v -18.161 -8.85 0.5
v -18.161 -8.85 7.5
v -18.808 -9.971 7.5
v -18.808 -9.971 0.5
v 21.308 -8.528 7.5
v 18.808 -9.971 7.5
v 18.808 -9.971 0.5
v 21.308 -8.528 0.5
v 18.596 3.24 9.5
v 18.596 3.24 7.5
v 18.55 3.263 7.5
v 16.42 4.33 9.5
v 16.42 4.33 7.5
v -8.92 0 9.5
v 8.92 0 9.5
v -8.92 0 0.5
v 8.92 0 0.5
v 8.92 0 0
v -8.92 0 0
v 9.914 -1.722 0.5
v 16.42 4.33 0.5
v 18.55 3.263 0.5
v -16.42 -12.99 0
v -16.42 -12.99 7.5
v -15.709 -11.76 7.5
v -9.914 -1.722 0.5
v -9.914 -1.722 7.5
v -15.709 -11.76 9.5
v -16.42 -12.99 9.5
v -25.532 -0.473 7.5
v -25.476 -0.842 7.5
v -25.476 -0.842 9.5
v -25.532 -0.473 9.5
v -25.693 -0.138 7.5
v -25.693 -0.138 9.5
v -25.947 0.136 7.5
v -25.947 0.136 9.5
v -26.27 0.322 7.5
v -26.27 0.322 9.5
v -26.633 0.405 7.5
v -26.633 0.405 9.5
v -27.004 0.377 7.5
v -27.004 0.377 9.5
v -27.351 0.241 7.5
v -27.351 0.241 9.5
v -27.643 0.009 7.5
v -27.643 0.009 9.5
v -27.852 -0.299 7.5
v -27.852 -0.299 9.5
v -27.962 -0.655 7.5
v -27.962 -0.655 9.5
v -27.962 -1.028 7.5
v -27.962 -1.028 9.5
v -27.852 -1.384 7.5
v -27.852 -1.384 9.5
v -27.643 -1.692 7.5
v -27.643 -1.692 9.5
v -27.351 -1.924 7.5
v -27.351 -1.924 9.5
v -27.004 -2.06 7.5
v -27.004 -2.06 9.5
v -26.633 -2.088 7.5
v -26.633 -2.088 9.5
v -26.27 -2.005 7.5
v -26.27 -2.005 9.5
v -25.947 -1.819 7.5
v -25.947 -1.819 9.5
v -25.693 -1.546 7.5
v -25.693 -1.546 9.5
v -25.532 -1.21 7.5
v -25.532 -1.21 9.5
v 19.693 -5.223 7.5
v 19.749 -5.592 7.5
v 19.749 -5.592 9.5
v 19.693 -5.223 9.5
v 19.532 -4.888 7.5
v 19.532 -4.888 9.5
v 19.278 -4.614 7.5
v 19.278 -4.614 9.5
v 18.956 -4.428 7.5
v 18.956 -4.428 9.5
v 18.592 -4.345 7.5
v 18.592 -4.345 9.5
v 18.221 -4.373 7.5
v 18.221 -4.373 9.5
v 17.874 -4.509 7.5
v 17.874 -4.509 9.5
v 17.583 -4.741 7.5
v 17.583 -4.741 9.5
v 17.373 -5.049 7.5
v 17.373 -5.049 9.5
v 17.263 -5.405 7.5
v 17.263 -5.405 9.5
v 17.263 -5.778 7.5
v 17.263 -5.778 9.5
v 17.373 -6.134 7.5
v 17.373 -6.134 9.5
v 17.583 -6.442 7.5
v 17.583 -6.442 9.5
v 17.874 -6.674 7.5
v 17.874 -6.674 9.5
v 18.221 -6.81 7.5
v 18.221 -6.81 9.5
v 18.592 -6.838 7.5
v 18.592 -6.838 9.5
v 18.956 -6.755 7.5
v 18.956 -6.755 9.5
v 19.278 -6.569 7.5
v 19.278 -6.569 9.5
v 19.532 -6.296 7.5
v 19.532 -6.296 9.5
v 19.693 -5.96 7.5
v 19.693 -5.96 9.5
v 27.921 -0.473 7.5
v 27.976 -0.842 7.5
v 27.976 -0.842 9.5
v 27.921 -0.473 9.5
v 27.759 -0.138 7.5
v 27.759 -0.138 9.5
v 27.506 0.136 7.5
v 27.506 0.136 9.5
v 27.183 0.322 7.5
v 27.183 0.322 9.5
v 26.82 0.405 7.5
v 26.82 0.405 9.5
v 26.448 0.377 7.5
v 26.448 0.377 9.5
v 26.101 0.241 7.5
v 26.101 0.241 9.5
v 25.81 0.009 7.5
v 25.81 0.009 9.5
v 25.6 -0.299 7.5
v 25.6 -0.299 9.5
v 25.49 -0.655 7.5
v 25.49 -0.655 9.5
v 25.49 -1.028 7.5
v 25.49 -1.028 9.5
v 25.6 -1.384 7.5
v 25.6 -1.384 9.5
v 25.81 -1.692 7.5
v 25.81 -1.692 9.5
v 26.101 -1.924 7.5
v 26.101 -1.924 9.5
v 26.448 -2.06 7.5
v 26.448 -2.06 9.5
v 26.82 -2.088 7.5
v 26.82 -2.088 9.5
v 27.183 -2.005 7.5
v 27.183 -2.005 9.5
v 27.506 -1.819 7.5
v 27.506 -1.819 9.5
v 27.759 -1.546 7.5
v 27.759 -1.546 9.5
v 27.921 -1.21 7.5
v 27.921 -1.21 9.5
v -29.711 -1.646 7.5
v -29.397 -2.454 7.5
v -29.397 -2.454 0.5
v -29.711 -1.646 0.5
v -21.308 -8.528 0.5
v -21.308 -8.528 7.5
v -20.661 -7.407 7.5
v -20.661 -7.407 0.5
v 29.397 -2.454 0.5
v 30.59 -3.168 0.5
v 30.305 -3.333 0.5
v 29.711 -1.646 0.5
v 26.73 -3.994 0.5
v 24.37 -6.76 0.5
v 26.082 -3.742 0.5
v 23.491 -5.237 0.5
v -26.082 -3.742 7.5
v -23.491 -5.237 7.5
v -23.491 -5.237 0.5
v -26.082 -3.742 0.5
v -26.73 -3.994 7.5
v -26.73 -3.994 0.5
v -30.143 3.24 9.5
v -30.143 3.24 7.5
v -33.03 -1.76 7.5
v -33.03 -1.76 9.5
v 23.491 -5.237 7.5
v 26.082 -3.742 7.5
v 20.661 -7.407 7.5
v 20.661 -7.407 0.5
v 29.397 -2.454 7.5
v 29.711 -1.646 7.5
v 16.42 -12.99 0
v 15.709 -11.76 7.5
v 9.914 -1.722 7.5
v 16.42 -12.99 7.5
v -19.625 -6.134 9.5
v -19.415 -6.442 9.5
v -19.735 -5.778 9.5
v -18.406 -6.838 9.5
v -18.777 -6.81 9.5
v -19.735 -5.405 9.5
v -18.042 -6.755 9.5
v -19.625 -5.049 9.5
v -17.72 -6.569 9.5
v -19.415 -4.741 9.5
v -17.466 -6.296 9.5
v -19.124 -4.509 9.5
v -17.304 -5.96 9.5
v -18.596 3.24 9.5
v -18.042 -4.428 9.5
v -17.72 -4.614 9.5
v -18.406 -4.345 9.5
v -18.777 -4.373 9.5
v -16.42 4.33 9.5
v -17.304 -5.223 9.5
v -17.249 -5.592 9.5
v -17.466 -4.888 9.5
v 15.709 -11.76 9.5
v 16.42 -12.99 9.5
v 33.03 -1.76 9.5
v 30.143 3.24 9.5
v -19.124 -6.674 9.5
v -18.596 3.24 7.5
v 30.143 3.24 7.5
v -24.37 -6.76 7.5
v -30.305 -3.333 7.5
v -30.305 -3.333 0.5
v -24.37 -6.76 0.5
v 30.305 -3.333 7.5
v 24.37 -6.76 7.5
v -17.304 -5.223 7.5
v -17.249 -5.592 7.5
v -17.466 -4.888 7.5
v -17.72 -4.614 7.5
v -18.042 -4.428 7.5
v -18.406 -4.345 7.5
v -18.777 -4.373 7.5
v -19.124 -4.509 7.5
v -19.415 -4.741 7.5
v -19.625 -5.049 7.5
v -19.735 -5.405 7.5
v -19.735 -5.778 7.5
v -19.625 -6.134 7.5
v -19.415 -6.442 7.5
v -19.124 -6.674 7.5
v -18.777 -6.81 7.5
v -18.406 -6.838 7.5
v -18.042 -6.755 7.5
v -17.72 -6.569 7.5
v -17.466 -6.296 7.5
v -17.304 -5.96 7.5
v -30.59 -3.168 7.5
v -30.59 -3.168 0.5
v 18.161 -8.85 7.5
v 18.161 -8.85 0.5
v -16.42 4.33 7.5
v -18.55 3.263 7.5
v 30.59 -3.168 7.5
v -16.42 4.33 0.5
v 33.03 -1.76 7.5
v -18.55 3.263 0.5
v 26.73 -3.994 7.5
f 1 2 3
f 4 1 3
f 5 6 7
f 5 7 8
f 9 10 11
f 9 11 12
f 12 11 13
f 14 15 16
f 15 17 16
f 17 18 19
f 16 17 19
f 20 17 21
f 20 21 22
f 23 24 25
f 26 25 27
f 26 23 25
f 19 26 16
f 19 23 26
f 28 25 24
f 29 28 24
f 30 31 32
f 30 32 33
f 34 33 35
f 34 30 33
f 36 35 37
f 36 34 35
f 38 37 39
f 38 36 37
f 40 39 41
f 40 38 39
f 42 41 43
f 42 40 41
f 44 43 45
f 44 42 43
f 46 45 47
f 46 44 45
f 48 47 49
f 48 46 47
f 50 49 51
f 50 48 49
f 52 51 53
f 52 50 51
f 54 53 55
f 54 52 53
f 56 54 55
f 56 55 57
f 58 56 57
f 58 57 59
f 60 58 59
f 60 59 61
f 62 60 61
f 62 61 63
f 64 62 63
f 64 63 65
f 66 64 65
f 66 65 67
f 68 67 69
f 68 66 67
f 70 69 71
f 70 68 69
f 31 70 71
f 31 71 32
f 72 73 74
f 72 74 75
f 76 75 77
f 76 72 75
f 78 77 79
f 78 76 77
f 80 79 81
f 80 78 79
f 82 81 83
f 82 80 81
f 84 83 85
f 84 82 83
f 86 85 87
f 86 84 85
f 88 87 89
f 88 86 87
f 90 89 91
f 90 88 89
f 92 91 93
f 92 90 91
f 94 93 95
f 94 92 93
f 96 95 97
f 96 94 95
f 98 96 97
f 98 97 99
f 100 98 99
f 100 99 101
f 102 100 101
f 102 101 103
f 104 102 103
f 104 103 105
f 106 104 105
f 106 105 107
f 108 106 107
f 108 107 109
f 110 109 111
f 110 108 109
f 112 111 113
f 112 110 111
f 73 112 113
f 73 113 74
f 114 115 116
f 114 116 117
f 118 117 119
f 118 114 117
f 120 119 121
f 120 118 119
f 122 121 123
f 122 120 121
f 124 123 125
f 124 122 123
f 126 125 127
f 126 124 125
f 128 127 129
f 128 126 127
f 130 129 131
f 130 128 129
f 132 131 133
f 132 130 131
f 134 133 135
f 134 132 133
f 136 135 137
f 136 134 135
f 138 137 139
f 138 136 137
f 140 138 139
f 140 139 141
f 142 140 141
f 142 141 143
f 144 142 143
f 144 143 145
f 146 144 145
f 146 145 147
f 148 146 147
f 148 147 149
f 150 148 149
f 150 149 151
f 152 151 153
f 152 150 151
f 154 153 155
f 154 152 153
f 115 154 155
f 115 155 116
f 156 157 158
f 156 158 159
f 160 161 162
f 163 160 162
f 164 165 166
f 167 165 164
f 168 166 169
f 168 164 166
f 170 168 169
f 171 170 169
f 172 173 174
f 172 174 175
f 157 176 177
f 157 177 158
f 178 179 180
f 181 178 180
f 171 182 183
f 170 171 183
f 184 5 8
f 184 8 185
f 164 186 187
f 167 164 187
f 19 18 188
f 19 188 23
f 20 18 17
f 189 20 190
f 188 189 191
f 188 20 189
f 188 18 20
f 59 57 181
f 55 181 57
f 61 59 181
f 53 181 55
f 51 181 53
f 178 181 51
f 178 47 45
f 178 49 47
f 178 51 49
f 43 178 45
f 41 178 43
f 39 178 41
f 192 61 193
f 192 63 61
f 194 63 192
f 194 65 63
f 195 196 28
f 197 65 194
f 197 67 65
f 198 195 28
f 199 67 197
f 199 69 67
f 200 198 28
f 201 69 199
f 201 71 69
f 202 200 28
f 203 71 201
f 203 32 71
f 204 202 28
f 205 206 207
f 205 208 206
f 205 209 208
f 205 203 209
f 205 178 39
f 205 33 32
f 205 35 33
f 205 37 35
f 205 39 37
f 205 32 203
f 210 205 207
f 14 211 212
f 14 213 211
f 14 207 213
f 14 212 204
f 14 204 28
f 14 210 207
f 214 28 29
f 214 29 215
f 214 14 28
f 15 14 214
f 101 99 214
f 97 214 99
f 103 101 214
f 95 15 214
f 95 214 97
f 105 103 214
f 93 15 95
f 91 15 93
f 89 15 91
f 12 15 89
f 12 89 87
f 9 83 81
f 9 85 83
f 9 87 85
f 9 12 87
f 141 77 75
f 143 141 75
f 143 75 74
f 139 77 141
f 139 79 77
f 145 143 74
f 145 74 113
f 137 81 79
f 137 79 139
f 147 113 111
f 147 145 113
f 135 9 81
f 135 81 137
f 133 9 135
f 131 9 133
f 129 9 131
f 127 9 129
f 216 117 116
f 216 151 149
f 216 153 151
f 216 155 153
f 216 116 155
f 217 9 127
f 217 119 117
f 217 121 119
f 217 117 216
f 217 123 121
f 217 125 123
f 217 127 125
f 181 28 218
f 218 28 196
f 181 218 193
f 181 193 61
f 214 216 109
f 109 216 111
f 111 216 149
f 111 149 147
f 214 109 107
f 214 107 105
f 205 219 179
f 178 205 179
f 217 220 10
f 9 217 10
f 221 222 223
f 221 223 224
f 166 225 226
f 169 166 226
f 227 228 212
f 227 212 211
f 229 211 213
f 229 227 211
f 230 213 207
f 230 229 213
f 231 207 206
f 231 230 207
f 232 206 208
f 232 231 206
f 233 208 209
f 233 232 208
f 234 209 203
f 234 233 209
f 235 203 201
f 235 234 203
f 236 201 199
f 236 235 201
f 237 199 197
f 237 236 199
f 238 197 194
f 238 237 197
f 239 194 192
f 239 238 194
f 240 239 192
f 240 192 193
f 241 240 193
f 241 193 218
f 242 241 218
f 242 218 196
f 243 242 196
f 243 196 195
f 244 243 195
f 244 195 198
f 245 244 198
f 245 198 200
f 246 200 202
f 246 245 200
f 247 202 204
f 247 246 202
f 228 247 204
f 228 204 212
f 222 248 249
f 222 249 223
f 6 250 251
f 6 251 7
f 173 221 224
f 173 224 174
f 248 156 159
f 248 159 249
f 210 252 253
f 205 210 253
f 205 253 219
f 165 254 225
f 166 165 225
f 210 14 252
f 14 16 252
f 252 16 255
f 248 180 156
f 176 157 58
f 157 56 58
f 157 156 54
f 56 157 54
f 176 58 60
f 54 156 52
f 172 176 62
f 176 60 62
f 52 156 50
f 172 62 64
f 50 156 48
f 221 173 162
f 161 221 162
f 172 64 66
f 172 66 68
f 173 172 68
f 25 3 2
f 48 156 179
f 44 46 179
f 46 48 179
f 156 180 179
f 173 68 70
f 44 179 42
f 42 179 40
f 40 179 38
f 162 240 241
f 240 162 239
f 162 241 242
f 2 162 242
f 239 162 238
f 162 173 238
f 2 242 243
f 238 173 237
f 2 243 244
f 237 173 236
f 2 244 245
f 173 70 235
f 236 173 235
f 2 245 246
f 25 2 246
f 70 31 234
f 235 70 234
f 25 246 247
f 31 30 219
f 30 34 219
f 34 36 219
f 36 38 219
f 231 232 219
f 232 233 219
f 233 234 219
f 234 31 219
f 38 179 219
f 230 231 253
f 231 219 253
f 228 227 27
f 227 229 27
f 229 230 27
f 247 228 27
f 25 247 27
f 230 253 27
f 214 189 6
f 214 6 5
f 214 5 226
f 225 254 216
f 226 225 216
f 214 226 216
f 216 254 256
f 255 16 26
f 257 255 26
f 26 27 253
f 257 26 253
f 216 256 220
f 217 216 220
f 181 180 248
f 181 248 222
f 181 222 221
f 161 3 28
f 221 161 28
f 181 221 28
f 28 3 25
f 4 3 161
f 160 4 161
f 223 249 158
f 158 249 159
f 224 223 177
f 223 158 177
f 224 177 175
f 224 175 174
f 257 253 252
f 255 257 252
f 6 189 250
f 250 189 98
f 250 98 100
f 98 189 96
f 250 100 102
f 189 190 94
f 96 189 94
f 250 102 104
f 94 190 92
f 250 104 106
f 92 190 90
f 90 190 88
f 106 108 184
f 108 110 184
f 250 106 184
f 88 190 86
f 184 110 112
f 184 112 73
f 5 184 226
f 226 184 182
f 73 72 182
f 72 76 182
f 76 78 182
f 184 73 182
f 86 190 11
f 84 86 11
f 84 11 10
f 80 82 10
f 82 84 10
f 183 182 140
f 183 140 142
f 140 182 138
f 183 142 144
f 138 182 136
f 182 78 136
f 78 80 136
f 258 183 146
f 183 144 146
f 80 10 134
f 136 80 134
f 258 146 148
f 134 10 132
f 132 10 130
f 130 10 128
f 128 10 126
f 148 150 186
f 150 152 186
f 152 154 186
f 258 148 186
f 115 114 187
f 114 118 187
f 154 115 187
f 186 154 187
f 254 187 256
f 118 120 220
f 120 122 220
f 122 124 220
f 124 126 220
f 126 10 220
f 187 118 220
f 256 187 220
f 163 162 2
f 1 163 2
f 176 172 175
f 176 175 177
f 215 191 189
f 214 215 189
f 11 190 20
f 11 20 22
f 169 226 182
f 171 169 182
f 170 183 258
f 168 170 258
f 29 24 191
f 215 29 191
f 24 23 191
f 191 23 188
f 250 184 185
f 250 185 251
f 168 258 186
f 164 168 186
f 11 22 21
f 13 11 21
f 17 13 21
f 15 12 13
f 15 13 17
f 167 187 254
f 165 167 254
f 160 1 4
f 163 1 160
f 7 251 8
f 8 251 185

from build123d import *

# Parameters (mm, degrees)
SALIENTE_EXTRUIR1_DEPTH = 7.5
CROQUIS2_R              = 1.25
SALIENTE_EXTRUIR2_DEPTH = 2
SALIENTE_EXTRUIR3_DEPTH = 7


with BuildPart() as part:
    # Croquis1 → Saliente-Extruir1 (new body)
    with BuildSketch(Plane.XY):
        Polygon((-8.919750427, 0), (8.919750427, 0), (16.419750427, -12.990381057), (-16.419750427, -12.990381057), align=None)
    extrude(amount=SALIENTE_EXTRUIR1_DEPTH)

    # Croquis2 → Saliente-Extruir2 (add)
    with BuildSketch(Plane.XY.offset(7.5)):
        Polygon((-8.919750427, 0), (-16.419750427, 4.330127019), (-18.59607878, 3.240107663), (-30.143084163, 3.240107663), (-33.029835509, -1.759892337), (-15.709327434, -11.759892337), (-16.419750427, -12.990381057), (16.419750427, -12.990381057), (15.709327434, -11.759892337), (33.029835509, -1.759892337), (30.143084163, 3.240107663), (18.59607878, 3.240107663), (16.419750427, 4.330127019), (8.919750427, 0), align=None)
        with Locations((-26.726205798, -0.841685406)):
            Circle(CROQUIS2_R, mode=Mode.SUBTRACT)
        with Locations((-18.498964463, -5.591685406)):
            Circle(CROQUIS2_R, mode=Mode.SUBTRACT)
        with Locations((18.498964463, -5.591685406)):
            Circle(CROQUIS2_R, mode=Mode.SUBTRACT)
        with Locations((26.726205798, -0.841685406)):
            Circle(CROQUIS2_R, mode=Mode.SUBTRACT)
    extrude(amount=SALIENTE_EXTRUIR2_DEPTH)

    # Croquis3 → Saliente-Extruir3 (add)
    with BuildSketch(Plane(origin=(0, 0, 7.5), x_dir=(-1, 0, 0), z_dir=(0, 0, -1))):
        Polygon((-18.549679438, 3.263346886), (-16.419750427, 4.330127019), (-8.919750427, 0), (-9.914162027, -1.722371415), align=None)
        Polygon((-30.305258965, -3.332927338), (-24.369581471, -6.759892337), (-23.490602897, -5.237456788), (-26.081610625, -3.741537779), (-26.729742931, -3.993881902), (-29.396625899, -2.454156302), (-29.711298573, -1.645936465), (-30.590277147, -3.168372014), align=None)
        Polygon((-21.307825634, -8.527597894), (-20.660765693, -7.4068572), (-18.160959134, -8.850121189), (-18.808019075, -9.970861884), align=None)
        Polygon((9.914162027, -1.722371415), (18.549679438, 3.263346886), (16.419750427, 4.330127019), (8.919750427, 0), align=None)
        Polygon((18.160959134, -8.850121189), (18.808019075, -9.970861884), (21.307825634, -8.527597894), (20.660765693, -7.4068572), align=None)
        Polygon((29.711298573, -1.645936465), (30.590277147, -3.168372014), (30.305258965, -3.332927338), (24.369581471, -6.759892337), (23.490602897, -5.237456788), (26.081610625, -3.741537779), (26.729742931, -3.993881902), (29.396625899, -2.454156302), align=None)
    extrude(amount=SALIENTE_EXTRUIR3_DEPTH)


solid = part.part
